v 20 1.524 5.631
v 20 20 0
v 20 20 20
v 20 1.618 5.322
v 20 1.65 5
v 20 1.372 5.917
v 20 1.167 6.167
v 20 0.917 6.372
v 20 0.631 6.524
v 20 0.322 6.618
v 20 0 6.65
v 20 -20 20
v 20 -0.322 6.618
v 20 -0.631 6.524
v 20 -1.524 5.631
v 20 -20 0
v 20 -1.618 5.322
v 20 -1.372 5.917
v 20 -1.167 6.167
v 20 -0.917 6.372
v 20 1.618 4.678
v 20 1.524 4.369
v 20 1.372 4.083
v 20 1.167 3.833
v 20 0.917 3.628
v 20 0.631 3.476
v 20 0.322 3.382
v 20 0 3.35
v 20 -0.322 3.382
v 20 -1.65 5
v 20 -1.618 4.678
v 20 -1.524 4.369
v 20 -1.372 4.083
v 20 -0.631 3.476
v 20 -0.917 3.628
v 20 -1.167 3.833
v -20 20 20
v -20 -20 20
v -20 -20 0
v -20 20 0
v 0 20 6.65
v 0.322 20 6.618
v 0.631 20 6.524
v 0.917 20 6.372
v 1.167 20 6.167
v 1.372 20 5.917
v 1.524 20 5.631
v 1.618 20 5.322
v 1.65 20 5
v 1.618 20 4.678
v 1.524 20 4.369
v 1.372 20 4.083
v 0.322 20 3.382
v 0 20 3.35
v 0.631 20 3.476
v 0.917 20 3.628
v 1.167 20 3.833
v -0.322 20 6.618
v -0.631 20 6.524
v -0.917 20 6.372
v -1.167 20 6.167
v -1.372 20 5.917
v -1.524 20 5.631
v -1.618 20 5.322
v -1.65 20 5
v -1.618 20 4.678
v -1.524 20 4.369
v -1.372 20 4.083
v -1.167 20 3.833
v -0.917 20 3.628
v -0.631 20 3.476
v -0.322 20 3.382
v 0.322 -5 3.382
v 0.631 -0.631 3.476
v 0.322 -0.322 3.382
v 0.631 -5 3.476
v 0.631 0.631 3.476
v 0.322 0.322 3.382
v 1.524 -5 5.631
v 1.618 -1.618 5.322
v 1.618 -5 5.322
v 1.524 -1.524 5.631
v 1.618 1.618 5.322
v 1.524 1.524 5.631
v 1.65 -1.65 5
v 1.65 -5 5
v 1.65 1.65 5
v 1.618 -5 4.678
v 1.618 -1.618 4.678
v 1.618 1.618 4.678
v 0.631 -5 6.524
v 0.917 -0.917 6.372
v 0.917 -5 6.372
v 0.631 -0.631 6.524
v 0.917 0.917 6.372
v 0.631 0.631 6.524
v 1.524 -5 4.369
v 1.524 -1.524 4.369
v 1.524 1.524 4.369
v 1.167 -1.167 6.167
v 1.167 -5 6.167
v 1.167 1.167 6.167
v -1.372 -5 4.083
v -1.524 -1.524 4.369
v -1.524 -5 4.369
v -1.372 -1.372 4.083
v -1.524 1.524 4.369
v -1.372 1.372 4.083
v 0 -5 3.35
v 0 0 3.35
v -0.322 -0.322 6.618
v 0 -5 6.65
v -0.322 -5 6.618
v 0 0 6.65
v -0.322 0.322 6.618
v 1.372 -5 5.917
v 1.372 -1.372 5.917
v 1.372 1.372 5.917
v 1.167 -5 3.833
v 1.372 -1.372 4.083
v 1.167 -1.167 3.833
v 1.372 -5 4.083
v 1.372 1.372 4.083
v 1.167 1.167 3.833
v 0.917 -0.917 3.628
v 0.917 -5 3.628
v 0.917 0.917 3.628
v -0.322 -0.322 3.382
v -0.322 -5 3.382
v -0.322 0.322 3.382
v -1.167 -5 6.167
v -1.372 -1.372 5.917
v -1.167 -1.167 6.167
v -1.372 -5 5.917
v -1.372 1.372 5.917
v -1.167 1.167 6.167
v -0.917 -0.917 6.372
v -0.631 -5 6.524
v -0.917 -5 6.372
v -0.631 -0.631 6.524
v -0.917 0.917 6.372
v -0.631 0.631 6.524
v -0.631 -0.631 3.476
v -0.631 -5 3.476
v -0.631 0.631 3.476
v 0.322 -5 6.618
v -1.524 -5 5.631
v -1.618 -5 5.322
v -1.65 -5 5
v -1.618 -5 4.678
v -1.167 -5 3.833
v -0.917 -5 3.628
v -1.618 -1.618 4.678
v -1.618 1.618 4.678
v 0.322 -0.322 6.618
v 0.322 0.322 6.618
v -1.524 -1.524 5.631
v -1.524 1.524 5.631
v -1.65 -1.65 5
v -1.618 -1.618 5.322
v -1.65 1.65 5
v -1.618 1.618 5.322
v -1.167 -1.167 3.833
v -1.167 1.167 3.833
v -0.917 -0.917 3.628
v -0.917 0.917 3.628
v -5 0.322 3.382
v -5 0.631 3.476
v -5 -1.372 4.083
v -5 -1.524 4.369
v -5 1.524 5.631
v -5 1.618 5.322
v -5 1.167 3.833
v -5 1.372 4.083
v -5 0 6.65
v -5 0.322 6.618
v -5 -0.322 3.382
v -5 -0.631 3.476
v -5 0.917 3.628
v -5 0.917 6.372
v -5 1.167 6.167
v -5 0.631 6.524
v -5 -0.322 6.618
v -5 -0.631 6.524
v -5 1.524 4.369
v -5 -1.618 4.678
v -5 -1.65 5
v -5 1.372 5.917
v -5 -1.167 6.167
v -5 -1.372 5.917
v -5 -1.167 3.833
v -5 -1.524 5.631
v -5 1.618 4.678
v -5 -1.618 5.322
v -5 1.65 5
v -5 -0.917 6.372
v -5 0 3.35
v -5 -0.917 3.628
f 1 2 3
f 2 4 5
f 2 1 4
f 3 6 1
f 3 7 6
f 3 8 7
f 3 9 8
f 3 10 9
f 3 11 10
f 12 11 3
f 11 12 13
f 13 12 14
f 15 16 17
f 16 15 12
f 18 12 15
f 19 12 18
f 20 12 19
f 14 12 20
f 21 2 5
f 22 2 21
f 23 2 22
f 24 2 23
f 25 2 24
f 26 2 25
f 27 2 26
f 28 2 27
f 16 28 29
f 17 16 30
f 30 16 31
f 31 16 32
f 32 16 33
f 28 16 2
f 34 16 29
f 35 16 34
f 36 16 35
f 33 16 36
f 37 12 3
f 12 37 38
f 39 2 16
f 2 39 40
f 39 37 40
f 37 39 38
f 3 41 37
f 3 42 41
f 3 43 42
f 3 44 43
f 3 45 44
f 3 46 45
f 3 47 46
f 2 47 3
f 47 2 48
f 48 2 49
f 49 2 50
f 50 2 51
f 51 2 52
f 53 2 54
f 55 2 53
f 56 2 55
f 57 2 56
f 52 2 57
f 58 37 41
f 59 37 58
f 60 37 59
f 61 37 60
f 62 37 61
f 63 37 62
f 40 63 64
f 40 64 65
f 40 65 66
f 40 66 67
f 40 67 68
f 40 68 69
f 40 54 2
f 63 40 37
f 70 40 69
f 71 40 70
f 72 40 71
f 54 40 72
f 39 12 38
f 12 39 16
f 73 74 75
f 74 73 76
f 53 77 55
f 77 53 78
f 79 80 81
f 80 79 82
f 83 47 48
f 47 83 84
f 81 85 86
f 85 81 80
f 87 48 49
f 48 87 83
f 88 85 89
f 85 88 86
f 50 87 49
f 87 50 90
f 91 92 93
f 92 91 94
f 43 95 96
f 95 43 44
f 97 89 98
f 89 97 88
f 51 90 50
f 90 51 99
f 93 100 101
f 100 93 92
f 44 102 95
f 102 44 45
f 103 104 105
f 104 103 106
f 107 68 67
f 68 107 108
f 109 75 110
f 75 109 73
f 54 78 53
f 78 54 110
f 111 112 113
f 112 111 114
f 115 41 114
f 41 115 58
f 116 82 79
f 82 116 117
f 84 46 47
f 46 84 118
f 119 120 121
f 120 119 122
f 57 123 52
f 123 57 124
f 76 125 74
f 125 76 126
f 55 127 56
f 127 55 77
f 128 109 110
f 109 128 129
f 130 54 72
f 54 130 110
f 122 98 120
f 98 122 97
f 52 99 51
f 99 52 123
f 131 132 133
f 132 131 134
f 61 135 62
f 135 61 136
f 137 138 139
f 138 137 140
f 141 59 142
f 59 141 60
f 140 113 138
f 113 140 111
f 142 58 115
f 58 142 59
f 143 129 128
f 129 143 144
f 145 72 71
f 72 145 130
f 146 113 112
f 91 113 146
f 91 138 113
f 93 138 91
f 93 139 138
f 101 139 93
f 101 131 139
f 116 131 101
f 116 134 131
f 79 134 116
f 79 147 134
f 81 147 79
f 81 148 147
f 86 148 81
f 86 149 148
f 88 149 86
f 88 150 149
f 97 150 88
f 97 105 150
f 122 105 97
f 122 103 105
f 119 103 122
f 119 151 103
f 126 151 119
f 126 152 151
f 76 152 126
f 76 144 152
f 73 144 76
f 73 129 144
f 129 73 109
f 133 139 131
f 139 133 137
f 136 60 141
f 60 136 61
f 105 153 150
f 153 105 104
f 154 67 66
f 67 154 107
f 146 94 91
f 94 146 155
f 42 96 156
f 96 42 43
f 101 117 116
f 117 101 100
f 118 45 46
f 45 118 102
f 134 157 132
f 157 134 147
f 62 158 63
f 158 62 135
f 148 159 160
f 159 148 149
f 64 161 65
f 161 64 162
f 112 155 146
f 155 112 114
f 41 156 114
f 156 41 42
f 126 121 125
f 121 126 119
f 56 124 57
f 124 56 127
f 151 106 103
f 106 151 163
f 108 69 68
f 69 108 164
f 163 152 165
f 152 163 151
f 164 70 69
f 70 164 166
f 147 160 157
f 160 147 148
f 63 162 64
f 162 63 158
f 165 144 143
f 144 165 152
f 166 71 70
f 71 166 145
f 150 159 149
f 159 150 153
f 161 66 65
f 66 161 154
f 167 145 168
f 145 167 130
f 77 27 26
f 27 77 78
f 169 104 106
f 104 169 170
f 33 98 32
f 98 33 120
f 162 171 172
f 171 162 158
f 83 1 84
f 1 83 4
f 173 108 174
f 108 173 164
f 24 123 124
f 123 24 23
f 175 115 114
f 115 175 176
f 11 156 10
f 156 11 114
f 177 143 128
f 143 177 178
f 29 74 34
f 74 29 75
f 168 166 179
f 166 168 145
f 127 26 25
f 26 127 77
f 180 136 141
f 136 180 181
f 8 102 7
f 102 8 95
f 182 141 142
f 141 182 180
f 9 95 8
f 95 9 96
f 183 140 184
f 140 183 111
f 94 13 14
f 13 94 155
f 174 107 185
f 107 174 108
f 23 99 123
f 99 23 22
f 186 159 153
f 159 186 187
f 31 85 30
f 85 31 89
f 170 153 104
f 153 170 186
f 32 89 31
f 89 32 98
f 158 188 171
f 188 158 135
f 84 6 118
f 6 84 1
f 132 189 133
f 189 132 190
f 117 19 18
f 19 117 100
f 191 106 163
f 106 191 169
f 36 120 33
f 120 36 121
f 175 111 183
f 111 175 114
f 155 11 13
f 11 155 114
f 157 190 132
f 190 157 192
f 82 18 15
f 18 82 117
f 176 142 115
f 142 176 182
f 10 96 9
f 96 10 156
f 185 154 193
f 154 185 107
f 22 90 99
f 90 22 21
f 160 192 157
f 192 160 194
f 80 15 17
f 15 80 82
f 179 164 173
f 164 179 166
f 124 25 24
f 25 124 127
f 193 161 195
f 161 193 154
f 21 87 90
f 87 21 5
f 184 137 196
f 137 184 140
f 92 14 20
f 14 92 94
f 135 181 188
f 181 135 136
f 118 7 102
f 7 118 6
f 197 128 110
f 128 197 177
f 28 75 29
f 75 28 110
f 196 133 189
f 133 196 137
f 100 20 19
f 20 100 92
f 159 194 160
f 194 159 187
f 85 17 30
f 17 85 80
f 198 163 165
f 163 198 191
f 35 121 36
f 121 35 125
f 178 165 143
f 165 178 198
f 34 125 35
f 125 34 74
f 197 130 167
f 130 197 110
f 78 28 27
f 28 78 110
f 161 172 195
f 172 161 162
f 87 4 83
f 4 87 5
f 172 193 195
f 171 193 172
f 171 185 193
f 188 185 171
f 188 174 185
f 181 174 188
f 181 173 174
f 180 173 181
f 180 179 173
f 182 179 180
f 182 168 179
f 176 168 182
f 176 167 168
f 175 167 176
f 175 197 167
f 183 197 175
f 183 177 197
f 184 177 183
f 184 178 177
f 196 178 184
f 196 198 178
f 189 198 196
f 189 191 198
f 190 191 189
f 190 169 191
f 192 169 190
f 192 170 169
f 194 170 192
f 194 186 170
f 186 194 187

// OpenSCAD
// 40x40x20 block the screws thread into; M4 pilots d3.3 from +Y face at z5 (x0) and a second along X at z5
difference() {
    translate([-20, -20, 0]) cube([40, 40, 20]);
    translate([0, 21, 5]) rotate([90, 0, 0]) cylinder(d = 3.3, h = 26, $fn = 32);
    translate([21, 0, 5]) rotate([0, -90, 0]) cylinder(d = 3.3, h = 26, $fn = 32);
}
